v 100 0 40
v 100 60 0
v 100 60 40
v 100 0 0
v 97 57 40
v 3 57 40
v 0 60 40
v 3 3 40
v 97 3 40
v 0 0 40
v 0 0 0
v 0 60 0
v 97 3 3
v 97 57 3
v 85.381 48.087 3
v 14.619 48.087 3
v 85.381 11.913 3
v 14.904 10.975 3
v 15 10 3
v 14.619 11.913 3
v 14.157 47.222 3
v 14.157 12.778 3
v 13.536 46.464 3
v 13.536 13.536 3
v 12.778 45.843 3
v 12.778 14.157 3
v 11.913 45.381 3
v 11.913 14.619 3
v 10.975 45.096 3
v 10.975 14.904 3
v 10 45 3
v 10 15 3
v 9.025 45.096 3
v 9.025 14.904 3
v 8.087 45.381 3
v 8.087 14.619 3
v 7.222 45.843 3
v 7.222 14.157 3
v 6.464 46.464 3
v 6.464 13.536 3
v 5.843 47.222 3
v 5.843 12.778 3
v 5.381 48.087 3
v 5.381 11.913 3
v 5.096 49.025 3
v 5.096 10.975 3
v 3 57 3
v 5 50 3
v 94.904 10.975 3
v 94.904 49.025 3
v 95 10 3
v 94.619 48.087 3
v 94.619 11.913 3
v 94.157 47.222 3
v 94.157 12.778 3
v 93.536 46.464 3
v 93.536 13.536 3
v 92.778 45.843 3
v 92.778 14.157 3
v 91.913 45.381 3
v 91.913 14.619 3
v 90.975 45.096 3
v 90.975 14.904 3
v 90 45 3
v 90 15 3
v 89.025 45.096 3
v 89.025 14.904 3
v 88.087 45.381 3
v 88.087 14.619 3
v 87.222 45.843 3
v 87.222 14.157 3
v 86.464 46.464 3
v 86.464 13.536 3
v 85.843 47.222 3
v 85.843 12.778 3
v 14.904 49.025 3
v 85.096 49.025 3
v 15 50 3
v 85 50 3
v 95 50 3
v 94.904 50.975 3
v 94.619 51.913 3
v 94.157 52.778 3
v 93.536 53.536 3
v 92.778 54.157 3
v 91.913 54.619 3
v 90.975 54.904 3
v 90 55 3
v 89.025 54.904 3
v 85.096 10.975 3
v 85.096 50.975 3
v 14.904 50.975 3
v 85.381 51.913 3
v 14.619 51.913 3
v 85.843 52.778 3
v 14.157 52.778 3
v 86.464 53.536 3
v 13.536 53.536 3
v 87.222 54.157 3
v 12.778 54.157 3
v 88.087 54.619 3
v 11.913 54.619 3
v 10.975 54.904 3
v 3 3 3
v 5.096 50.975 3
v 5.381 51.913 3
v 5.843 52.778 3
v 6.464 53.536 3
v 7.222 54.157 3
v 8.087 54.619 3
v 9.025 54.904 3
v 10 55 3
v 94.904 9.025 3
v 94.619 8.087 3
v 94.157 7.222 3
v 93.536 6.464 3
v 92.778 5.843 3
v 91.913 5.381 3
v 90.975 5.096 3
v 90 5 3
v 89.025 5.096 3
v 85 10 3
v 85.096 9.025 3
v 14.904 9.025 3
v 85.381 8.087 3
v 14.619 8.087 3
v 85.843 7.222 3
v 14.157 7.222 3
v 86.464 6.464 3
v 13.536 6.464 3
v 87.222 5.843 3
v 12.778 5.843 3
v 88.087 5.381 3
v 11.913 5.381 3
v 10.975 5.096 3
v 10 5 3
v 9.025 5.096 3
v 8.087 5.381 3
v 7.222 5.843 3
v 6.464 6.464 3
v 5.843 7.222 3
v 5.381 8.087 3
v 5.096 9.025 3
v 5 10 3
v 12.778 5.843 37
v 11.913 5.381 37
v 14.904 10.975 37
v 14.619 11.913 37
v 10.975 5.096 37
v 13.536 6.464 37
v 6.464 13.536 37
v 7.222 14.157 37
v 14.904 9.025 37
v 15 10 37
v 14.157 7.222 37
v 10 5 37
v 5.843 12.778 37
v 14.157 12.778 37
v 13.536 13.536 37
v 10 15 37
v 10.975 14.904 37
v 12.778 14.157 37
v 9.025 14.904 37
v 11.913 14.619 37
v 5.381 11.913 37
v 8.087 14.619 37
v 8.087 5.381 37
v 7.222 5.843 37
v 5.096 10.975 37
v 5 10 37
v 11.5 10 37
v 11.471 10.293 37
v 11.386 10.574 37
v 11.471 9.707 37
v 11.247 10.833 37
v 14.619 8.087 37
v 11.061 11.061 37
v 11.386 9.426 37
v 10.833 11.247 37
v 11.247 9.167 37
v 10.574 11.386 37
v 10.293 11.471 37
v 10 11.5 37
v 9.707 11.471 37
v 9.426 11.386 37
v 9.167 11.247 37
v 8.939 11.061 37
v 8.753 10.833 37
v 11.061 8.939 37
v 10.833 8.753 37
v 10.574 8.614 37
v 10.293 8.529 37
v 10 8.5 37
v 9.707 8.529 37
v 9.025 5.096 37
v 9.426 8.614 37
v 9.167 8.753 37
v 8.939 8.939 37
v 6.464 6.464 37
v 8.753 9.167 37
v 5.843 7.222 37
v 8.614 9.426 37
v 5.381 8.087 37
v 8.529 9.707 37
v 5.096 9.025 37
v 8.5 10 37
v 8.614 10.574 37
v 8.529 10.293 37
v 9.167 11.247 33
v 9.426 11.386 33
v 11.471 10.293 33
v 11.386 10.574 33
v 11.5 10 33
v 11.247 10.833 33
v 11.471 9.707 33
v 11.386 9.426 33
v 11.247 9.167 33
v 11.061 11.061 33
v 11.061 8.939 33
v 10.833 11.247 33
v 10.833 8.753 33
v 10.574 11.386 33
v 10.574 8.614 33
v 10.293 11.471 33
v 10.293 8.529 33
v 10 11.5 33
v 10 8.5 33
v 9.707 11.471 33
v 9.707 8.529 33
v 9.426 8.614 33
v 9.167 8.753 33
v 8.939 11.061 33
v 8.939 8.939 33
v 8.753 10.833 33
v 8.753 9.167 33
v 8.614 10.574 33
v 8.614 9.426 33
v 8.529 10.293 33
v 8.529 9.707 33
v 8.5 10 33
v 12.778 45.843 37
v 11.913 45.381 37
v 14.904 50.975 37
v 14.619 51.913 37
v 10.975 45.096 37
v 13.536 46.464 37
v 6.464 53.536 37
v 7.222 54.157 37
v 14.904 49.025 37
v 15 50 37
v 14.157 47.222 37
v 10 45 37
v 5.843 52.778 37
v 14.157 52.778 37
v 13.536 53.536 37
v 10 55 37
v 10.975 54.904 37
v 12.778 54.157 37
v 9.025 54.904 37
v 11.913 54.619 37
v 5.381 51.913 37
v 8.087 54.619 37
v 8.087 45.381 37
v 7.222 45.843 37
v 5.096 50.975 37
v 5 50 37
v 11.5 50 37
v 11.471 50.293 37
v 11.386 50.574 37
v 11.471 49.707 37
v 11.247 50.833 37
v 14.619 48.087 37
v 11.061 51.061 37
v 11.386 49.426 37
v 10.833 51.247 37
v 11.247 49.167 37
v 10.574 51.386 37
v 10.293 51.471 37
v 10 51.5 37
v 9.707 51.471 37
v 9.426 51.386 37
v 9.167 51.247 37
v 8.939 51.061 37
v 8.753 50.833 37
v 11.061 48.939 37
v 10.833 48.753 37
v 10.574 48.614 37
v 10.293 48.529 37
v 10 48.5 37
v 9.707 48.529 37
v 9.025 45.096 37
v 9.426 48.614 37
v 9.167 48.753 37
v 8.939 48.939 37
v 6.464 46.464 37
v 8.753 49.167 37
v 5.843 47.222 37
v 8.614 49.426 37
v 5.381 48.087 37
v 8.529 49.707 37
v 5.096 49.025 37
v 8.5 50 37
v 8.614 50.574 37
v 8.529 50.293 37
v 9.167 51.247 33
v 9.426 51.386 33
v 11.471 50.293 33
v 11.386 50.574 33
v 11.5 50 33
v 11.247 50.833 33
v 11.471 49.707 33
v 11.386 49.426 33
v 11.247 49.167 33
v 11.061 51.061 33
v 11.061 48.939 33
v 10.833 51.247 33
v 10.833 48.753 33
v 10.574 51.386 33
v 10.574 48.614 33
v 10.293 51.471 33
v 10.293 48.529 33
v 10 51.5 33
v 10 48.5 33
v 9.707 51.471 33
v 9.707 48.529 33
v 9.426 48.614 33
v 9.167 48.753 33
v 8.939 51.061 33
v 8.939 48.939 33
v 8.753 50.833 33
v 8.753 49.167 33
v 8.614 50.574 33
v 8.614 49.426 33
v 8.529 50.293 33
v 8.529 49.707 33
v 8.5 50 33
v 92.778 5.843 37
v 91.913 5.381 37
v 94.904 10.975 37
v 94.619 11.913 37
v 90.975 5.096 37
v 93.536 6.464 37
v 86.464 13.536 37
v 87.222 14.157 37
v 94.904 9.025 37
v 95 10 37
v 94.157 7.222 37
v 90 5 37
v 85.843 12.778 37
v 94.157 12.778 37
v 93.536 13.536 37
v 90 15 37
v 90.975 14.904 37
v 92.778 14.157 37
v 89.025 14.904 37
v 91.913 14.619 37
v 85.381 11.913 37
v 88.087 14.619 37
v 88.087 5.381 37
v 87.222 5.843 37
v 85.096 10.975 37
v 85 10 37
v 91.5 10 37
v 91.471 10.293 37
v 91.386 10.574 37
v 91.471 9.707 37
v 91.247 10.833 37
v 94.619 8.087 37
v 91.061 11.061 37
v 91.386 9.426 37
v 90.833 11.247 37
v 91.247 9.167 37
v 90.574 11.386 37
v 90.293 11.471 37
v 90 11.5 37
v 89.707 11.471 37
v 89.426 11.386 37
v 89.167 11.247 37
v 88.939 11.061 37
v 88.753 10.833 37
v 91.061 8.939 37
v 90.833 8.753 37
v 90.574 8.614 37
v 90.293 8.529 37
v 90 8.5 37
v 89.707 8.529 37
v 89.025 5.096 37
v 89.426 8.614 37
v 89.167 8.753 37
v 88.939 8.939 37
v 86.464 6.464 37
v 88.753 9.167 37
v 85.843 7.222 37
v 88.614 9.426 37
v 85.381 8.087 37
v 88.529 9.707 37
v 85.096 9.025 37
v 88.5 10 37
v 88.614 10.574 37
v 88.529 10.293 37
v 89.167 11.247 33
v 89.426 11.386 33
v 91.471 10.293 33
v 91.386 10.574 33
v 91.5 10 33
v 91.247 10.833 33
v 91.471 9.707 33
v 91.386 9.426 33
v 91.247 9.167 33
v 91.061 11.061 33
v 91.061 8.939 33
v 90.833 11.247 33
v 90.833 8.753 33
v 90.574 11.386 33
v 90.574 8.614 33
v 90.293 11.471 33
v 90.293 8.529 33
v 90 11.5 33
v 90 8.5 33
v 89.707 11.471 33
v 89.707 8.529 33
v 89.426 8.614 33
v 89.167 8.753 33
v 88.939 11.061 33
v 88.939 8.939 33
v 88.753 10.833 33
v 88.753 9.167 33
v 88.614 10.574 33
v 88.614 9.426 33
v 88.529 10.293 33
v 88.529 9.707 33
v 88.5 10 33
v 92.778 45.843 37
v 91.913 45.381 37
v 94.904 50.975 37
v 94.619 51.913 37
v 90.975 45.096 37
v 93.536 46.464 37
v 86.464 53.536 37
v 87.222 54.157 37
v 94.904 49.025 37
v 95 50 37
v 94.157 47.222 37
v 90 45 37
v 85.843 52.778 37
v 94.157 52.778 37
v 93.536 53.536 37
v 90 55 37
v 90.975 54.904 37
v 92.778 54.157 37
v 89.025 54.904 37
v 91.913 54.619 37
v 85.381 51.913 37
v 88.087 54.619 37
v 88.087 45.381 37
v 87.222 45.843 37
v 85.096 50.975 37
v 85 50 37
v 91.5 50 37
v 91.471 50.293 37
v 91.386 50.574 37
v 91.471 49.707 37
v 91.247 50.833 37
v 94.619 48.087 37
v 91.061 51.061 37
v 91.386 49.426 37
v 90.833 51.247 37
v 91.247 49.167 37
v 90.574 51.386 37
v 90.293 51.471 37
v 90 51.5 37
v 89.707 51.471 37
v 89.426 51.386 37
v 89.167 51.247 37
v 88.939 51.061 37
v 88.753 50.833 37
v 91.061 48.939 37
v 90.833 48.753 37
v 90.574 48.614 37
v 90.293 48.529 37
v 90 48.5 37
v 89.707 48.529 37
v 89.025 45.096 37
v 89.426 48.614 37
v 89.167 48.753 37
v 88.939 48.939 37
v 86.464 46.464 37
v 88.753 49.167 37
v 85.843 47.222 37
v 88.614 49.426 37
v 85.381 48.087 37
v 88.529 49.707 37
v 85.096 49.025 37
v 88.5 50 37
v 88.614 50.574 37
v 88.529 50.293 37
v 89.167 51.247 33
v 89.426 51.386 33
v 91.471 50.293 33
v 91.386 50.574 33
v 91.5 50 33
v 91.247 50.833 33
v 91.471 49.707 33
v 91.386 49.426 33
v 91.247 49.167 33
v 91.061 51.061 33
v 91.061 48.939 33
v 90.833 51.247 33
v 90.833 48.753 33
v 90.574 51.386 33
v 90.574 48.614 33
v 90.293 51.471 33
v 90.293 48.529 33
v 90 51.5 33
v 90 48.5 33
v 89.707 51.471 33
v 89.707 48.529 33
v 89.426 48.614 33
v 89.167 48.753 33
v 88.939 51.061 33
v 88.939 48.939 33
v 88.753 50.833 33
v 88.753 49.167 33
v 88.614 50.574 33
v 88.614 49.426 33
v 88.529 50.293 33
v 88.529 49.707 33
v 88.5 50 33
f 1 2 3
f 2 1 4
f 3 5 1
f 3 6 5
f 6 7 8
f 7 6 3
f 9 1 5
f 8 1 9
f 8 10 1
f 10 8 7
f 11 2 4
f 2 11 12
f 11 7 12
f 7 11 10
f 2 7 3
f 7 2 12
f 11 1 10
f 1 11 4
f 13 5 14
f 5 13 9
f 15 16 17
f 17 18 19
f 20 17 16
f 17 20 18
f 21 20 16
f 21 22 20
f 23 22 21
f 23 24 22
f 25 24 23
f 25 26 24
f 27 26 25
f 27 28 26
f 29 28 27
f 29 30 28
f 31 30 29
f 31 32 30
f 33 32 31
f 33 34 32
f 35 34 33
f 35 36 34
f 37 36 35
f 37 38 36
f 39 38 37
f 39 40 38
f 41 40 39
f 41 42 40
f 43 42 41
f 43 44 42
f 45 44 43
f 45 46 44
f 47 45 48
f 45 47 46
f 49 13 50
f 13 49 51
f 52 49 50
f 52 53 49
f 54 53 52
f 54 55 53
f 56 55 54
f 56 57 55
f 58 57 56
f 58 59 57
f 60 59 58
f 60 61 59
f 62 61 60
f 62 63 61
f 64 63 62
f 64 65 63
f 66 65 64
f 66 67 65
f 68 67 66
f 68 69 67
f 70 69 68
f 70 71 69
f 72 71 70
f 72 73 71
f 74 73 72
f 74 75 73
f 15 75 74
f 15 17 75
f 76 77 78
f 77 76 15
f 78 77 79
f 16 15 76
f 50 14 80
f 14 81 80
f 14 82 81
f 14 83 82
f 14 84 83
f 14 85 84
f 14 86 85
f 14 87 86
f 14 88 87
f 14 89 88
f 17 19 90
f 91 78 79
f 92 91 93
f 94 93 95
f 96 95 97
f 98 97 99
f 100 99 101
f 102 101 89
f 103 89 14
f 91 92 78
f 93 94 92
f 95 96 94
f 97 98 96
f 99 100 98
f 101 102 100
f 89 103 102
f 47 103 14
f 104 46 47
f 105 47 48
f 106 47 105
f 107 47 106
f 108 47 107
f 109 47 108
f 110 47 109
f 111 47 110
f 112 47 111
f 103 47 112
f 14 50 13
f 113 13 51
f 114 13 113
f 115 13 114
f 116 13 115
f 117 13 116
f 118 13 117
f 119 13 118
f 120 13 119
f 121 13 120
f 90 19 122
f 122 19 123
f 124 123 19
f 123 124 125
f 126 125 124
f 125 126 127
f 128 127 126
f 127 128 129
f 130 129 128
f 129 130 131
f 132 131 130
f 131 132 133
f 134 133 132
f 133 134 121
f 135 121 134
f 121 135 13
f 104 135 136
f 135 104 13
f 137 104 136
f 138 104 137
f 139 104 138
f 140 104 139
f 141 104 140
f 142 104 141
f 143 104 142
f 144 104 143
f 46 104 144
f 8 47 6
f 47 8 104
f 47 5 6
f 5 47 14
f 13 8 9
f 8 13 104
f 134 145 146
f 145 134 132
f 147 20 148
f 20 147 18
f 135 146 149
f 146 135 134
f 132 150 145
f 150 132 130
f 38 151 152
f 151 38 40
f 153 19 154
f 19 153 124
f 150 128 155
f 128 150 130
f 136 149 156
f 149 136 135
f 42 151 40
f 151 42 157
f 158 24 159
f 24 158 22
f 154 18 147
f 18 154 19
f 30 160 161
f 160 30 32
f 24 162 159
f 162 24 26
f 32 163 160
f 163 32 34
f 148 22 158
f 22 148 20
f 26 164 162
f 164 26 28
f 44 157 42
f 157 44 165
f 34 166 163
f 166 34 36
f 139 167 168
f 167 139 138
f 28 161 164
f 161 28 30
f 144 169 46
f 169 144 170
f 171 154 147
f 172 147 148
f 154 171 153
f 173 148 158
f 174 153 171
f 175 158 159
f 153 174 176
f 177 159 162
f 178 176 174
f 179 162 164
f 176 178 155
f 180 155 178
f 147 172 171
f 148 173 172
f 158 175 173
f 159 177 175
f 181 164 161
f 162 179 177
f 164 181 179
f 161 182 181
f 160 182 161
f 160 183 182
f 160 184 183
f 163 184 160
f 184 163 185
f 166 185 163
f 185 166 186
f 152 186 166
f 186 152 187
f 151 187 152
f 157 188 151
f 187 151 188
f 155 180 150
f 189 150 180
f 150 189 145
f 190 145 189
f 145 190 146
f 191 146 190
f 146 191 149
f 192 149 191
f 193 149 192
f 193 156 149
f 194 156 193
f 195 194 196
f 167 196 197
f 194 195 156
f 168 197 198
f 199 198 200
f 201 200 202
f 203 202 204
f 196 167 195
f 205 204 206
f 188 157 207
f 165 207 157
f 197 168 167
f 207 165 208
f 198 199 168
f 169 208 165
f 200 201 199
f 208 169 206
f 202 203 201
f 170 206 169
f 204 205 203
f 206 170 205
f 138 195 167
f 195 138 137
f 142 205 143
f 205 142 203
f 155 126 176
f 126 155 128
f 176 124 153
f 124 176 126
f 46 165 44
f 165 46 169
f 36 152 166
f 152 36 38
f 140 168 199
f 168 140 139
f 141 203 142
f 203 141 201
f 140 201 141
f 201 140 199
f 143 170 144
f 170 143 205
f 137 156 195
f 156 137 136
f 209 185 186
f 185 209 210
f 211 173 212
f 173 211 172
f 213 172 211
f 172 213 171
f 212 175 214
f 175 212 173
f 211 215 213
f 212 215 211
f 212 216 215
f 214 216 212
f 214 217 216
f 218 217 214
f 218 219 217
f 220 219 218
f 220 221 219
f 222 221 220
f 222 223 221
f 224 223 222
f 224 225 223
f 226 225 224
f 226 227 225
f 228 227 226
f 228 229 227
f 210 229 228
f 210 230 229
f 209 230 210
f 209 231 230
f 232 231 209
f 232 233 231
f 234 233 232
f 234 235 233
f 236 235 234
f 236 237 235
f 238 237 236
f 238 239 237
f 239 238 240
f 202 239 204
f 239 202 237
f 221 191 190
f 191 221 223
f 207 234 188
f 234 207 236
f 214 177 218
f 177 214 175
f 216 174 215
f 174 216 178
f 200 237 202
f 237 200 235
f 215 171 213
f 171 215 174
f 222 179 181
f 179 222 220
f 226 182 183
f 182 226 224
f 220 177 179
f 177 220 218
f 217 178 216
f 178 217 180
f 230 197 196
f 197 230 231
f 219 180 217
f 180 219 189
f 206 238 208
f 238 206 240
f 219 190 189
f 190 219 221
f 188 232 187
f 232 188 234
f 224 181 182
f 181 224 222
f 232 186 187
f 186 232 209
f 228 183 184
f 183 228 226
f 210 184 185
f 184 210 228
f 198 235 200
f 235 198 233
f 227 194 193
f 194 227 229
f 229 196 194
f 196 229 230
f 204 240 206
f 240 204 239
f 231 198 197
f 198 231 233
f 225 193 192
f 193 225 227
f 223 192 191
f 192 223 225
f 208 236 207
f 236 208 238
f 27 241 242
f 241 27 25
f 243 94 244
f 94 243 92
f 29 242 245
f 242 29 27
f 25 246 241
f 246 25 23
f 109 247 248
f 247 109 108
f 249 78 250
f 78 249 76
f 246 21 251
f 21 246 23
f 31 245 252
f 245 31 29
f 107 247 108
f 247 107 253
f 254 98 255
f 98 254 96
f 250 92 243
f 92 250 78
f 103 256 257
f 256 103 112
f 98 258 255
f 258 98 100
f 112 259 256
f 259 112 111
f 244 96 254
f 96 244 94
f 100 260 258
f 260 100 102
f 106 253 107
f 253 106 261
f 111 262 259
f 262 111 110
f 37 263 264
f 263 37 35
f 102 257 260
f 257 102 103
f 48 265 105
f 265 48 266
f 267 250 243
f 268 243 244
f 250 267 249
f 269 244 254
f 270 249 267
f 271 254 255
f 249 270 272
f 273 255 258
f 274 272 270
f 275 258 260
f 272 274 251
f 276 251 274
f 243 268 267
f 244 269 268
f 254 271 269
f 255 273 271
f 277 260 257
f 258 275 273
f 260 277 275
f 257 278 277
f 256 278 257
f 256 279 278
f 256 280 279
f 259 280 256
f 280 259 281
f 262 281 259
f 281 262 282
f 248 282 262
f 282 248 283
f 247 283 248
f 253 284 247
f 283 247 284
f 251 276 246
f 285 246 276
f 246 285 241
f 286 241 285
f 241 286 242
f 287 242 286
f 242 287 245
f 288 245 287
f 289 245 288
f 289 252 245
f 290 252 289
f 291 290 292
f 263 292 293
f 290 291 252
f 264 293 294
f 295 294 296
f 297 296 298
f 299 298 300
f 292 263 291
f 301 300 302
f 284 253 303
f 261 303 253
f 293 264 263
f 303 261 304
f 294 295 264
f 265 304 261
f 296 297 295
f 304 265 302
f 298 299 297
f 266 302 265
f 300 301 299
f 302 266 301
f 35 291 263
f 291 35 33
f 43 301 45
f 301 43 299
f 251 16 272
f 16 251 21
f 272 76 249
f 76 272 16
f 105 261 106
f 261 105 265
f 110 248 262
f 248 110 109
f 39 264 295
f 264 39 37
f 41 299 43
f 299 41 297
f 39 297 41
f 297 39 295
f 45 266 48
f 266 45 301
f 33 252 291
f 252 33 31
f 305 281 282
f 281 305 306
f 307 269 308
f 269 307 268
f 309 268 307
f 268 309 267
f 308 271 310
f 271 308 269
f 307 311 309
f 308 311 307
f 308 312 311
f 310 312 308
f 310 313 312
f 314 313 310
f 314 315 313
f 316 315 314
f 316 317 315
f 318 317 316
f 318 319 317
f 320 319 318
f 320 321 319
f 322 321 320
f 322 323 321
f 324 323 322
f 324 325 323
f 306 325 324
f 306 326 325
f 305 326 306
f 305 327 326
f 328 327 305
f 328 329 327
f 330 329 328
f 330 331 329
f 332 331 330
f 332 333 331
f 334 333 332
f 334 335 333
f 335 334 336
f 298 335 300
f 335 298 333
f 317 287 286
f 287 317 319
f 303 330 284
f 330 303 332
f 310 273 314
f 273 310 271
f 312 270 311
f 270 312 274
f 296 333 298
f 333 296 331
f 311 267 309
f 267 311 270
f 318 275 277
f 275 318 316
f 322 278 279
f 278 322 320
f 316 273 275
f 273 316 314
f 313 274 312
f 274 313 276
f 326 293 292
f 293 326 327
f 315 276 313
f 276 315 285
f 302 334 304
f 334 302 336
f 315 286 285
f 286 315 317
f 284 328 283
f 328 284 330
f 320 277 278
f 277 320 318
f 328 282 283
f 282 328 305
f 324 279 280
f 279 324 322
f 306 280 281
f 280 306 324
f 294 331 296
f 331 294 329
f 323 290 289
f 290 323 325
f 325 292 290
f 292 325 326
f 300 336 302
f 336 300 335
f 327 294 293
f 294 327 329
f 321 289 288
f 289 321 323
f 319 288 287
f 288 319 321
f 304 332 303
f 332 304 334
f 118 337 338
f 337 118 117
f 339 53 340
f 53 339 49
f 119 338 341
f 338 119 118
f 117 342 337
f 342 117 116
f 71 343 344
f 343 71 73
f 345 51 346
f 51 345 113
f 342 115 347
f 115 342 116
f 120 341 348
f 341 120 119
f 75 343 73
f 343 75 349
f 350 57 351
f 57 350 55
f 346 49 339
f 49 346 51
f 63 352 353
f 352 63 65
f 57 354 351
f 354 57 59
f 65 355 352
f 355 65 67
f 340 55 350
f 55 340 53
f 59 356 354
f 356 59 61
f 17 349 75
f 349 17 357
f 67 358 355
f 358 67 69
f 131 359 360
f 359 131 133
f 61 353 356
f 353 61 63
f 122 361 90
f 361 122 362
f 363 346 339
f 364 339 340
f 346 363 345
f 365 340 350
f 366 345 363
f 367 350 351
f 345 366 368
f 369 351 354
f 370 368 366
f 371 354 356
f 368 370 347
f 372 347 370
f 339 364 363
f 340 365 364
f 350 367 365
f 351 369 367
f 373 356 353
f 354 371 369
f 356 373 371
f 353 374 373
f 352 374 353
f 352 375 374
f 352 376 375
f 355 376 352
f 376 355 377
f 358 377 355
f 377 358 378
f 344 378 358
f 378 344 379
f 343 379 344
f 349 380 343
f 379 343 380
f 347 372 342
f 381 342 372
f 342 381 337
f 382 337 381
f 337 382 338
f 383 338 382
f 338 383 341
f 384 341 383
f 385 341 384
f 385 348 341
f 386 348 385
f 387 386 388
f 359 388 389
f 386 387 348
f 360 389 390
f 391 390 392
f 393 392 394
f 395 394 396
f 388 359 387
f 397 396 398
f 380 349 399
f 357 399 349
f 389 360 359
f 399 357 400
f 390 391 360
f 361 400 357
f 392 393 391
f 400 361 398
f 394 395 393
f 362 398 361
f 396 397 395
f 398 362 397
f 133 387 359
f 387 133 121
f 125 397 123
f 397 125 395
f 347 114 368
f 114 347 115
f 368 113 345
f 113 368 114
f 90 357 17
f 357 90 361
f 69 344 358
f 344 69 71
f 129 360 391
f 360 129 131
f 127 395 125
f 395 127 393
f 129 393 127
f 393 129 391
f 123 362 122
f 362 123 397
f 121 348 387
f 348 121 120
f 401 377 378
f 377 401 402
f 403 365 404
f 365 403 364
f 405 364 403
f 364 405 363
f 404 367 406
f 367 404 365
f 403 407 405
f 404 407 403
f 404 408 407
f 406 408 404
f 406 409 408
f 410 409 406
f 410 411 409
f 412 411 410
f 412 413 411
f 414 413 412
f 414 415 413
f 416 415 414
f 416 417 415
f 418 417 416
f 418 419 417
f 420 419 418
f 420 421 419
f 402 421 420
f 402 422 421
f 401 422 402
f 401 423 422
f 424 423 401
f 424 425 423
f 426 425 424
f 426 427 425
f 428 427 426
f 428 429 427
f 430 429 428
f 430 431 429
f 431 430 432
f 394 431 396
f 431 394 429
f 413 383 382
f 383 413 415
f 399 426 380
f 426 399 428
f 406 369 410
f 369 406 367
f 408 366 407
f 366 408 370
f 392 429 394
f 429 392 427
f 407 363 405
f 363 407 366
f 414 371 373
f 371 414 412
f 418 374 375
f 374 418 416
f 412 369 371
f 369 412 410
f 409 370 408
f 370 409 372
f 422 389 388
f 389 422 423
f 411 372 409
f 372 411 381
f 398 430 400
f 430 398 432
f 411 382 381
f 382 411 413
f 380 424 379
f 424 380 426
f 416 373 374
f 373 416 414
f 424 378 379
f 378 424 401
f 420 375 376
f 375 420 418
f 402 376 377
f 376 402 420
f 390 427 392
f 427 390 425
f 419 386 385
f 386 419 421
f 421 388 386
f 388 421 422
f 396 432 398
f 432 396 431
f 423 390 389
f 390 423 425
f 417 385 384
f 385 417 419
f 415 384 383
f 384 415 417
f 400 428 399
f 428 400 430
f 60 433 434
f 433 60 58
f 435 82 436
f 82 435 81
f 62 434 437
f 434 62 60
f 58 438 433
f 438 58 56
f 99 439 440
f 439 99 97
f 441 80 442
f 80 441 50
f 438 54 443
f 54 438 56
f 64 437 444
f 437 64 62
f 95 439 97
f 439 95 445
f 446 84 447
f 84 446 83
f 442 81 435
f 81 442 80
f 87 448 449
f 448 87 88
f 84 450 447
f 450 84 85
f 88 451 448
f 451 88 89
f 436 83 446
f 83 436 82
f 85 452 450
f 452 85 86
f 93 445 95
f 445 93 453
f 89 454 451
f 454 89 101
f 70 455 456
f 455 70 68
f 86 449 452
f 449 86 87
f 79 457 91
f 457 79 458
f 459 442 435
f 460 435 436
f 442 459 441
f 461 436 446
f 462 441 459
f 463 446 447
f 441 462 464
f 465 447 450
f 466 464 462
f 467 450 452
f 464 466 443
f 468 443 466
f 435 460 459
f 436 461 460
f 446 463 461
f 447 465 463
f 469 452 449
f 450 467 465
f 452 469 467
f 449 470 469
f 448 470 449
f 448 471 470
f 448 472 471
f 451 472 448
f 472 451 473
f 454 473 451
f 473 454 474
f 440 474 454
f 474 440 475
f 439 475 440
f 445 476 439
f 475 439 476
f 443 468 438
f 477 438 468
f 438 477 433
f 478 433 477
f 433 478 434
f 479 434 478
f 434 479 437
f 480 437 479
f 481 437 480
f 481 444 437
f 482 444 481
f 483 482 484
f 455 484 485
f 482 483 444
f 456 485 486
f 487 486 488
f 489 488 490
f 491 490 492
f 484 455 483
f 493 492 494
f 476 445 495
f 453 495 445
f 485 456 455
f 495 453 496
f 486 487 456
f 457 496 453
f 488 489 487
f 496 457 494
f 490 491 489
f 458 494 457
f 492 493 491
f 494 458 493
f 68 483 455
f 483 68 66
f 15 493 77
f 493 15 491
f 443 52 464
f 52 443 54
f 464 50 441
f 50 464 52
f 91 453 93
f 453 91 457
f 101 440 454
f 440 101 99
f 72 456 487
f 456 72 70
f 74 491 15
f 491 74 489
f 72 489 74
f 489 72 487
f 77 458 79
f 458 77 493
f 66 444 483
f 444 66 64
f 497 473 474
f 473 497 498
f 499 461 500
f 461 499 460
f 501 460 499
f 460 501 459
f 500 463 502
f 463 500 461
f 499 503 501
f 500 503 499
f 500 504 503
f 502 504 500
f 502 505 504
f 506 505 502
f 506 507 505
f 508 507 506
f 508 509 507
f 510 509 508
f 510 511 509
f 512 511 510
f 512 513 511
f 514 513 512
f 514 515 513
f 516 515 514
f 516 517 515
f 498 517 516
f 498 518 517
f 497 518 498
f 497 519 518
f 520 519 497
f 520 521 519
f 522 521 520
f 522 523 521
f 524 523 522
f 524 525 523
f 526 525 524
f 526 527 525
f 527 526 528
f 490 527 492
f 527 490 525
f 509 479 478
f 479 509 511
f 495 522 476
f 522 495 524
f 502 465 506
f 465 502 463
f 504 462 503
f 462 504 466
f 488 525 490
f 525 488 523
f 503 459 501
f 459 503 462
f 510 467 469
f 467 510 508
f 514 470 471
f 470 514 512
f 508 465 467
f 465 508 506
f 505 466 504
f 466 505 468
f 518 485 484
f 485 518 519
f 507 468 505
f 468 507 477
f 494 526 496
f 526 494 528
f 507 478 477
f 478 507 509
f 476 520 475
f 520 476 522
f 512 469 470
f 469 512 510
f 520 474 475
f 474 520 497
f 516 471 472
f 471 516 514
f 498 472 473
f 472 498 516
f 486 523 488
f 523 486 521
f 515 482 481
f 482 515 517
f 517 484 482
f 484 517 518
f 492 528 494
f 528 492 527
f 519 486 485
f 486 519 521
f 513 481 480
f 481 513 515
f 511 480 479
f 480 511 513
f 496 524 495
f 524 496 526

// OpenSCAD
$fn = 32;

// ----------------------------------------------------------------------
// Enclosure box: bosses enclosure
// ----------------------------------------------------------------------

// --- parameters (mm) ---
box_l = 100;              // outer length, X
box_w = 60;               // outer width, Y
box_h = 40;               // outer height
wall_t = 3;               // wall thickness
boss_r = 5;               // corner boss radius
hole_r = 1.5;             // boss screw hole radius
boss_in = 10;             // boss inset from the corners
fit_tol = 0.02;           // tolerance for press fits, mm
free_tol = 0.2;           // tolerance for clearance fits, mm

inner_h = box_h - wall_t;  // cavity depth
boss_h = inner_h - 2;  // corner boss height

difference() {
  union() {
    difference() {
      cube([box_l, box_w, box_h]);
      translate([wall_t, wall_t, wall_t])
        cube([box_l - 2 * wall_t, box_w - 2 * wall_t, box_h]);
    }
    for (sx = [0, 1], sy = [0, 1])
      translate([sx ? box_l - boss_in : boss_in,
                 sy ? box_w - boss_in : boss_in, wall_t - 1])
        difference() {
          cylinder(r = boss_r, h = boss_h);
          translate([0, 0, boss_h - 4])
            cylinder(r = hole_r, h = 5);
        }
  }
}
